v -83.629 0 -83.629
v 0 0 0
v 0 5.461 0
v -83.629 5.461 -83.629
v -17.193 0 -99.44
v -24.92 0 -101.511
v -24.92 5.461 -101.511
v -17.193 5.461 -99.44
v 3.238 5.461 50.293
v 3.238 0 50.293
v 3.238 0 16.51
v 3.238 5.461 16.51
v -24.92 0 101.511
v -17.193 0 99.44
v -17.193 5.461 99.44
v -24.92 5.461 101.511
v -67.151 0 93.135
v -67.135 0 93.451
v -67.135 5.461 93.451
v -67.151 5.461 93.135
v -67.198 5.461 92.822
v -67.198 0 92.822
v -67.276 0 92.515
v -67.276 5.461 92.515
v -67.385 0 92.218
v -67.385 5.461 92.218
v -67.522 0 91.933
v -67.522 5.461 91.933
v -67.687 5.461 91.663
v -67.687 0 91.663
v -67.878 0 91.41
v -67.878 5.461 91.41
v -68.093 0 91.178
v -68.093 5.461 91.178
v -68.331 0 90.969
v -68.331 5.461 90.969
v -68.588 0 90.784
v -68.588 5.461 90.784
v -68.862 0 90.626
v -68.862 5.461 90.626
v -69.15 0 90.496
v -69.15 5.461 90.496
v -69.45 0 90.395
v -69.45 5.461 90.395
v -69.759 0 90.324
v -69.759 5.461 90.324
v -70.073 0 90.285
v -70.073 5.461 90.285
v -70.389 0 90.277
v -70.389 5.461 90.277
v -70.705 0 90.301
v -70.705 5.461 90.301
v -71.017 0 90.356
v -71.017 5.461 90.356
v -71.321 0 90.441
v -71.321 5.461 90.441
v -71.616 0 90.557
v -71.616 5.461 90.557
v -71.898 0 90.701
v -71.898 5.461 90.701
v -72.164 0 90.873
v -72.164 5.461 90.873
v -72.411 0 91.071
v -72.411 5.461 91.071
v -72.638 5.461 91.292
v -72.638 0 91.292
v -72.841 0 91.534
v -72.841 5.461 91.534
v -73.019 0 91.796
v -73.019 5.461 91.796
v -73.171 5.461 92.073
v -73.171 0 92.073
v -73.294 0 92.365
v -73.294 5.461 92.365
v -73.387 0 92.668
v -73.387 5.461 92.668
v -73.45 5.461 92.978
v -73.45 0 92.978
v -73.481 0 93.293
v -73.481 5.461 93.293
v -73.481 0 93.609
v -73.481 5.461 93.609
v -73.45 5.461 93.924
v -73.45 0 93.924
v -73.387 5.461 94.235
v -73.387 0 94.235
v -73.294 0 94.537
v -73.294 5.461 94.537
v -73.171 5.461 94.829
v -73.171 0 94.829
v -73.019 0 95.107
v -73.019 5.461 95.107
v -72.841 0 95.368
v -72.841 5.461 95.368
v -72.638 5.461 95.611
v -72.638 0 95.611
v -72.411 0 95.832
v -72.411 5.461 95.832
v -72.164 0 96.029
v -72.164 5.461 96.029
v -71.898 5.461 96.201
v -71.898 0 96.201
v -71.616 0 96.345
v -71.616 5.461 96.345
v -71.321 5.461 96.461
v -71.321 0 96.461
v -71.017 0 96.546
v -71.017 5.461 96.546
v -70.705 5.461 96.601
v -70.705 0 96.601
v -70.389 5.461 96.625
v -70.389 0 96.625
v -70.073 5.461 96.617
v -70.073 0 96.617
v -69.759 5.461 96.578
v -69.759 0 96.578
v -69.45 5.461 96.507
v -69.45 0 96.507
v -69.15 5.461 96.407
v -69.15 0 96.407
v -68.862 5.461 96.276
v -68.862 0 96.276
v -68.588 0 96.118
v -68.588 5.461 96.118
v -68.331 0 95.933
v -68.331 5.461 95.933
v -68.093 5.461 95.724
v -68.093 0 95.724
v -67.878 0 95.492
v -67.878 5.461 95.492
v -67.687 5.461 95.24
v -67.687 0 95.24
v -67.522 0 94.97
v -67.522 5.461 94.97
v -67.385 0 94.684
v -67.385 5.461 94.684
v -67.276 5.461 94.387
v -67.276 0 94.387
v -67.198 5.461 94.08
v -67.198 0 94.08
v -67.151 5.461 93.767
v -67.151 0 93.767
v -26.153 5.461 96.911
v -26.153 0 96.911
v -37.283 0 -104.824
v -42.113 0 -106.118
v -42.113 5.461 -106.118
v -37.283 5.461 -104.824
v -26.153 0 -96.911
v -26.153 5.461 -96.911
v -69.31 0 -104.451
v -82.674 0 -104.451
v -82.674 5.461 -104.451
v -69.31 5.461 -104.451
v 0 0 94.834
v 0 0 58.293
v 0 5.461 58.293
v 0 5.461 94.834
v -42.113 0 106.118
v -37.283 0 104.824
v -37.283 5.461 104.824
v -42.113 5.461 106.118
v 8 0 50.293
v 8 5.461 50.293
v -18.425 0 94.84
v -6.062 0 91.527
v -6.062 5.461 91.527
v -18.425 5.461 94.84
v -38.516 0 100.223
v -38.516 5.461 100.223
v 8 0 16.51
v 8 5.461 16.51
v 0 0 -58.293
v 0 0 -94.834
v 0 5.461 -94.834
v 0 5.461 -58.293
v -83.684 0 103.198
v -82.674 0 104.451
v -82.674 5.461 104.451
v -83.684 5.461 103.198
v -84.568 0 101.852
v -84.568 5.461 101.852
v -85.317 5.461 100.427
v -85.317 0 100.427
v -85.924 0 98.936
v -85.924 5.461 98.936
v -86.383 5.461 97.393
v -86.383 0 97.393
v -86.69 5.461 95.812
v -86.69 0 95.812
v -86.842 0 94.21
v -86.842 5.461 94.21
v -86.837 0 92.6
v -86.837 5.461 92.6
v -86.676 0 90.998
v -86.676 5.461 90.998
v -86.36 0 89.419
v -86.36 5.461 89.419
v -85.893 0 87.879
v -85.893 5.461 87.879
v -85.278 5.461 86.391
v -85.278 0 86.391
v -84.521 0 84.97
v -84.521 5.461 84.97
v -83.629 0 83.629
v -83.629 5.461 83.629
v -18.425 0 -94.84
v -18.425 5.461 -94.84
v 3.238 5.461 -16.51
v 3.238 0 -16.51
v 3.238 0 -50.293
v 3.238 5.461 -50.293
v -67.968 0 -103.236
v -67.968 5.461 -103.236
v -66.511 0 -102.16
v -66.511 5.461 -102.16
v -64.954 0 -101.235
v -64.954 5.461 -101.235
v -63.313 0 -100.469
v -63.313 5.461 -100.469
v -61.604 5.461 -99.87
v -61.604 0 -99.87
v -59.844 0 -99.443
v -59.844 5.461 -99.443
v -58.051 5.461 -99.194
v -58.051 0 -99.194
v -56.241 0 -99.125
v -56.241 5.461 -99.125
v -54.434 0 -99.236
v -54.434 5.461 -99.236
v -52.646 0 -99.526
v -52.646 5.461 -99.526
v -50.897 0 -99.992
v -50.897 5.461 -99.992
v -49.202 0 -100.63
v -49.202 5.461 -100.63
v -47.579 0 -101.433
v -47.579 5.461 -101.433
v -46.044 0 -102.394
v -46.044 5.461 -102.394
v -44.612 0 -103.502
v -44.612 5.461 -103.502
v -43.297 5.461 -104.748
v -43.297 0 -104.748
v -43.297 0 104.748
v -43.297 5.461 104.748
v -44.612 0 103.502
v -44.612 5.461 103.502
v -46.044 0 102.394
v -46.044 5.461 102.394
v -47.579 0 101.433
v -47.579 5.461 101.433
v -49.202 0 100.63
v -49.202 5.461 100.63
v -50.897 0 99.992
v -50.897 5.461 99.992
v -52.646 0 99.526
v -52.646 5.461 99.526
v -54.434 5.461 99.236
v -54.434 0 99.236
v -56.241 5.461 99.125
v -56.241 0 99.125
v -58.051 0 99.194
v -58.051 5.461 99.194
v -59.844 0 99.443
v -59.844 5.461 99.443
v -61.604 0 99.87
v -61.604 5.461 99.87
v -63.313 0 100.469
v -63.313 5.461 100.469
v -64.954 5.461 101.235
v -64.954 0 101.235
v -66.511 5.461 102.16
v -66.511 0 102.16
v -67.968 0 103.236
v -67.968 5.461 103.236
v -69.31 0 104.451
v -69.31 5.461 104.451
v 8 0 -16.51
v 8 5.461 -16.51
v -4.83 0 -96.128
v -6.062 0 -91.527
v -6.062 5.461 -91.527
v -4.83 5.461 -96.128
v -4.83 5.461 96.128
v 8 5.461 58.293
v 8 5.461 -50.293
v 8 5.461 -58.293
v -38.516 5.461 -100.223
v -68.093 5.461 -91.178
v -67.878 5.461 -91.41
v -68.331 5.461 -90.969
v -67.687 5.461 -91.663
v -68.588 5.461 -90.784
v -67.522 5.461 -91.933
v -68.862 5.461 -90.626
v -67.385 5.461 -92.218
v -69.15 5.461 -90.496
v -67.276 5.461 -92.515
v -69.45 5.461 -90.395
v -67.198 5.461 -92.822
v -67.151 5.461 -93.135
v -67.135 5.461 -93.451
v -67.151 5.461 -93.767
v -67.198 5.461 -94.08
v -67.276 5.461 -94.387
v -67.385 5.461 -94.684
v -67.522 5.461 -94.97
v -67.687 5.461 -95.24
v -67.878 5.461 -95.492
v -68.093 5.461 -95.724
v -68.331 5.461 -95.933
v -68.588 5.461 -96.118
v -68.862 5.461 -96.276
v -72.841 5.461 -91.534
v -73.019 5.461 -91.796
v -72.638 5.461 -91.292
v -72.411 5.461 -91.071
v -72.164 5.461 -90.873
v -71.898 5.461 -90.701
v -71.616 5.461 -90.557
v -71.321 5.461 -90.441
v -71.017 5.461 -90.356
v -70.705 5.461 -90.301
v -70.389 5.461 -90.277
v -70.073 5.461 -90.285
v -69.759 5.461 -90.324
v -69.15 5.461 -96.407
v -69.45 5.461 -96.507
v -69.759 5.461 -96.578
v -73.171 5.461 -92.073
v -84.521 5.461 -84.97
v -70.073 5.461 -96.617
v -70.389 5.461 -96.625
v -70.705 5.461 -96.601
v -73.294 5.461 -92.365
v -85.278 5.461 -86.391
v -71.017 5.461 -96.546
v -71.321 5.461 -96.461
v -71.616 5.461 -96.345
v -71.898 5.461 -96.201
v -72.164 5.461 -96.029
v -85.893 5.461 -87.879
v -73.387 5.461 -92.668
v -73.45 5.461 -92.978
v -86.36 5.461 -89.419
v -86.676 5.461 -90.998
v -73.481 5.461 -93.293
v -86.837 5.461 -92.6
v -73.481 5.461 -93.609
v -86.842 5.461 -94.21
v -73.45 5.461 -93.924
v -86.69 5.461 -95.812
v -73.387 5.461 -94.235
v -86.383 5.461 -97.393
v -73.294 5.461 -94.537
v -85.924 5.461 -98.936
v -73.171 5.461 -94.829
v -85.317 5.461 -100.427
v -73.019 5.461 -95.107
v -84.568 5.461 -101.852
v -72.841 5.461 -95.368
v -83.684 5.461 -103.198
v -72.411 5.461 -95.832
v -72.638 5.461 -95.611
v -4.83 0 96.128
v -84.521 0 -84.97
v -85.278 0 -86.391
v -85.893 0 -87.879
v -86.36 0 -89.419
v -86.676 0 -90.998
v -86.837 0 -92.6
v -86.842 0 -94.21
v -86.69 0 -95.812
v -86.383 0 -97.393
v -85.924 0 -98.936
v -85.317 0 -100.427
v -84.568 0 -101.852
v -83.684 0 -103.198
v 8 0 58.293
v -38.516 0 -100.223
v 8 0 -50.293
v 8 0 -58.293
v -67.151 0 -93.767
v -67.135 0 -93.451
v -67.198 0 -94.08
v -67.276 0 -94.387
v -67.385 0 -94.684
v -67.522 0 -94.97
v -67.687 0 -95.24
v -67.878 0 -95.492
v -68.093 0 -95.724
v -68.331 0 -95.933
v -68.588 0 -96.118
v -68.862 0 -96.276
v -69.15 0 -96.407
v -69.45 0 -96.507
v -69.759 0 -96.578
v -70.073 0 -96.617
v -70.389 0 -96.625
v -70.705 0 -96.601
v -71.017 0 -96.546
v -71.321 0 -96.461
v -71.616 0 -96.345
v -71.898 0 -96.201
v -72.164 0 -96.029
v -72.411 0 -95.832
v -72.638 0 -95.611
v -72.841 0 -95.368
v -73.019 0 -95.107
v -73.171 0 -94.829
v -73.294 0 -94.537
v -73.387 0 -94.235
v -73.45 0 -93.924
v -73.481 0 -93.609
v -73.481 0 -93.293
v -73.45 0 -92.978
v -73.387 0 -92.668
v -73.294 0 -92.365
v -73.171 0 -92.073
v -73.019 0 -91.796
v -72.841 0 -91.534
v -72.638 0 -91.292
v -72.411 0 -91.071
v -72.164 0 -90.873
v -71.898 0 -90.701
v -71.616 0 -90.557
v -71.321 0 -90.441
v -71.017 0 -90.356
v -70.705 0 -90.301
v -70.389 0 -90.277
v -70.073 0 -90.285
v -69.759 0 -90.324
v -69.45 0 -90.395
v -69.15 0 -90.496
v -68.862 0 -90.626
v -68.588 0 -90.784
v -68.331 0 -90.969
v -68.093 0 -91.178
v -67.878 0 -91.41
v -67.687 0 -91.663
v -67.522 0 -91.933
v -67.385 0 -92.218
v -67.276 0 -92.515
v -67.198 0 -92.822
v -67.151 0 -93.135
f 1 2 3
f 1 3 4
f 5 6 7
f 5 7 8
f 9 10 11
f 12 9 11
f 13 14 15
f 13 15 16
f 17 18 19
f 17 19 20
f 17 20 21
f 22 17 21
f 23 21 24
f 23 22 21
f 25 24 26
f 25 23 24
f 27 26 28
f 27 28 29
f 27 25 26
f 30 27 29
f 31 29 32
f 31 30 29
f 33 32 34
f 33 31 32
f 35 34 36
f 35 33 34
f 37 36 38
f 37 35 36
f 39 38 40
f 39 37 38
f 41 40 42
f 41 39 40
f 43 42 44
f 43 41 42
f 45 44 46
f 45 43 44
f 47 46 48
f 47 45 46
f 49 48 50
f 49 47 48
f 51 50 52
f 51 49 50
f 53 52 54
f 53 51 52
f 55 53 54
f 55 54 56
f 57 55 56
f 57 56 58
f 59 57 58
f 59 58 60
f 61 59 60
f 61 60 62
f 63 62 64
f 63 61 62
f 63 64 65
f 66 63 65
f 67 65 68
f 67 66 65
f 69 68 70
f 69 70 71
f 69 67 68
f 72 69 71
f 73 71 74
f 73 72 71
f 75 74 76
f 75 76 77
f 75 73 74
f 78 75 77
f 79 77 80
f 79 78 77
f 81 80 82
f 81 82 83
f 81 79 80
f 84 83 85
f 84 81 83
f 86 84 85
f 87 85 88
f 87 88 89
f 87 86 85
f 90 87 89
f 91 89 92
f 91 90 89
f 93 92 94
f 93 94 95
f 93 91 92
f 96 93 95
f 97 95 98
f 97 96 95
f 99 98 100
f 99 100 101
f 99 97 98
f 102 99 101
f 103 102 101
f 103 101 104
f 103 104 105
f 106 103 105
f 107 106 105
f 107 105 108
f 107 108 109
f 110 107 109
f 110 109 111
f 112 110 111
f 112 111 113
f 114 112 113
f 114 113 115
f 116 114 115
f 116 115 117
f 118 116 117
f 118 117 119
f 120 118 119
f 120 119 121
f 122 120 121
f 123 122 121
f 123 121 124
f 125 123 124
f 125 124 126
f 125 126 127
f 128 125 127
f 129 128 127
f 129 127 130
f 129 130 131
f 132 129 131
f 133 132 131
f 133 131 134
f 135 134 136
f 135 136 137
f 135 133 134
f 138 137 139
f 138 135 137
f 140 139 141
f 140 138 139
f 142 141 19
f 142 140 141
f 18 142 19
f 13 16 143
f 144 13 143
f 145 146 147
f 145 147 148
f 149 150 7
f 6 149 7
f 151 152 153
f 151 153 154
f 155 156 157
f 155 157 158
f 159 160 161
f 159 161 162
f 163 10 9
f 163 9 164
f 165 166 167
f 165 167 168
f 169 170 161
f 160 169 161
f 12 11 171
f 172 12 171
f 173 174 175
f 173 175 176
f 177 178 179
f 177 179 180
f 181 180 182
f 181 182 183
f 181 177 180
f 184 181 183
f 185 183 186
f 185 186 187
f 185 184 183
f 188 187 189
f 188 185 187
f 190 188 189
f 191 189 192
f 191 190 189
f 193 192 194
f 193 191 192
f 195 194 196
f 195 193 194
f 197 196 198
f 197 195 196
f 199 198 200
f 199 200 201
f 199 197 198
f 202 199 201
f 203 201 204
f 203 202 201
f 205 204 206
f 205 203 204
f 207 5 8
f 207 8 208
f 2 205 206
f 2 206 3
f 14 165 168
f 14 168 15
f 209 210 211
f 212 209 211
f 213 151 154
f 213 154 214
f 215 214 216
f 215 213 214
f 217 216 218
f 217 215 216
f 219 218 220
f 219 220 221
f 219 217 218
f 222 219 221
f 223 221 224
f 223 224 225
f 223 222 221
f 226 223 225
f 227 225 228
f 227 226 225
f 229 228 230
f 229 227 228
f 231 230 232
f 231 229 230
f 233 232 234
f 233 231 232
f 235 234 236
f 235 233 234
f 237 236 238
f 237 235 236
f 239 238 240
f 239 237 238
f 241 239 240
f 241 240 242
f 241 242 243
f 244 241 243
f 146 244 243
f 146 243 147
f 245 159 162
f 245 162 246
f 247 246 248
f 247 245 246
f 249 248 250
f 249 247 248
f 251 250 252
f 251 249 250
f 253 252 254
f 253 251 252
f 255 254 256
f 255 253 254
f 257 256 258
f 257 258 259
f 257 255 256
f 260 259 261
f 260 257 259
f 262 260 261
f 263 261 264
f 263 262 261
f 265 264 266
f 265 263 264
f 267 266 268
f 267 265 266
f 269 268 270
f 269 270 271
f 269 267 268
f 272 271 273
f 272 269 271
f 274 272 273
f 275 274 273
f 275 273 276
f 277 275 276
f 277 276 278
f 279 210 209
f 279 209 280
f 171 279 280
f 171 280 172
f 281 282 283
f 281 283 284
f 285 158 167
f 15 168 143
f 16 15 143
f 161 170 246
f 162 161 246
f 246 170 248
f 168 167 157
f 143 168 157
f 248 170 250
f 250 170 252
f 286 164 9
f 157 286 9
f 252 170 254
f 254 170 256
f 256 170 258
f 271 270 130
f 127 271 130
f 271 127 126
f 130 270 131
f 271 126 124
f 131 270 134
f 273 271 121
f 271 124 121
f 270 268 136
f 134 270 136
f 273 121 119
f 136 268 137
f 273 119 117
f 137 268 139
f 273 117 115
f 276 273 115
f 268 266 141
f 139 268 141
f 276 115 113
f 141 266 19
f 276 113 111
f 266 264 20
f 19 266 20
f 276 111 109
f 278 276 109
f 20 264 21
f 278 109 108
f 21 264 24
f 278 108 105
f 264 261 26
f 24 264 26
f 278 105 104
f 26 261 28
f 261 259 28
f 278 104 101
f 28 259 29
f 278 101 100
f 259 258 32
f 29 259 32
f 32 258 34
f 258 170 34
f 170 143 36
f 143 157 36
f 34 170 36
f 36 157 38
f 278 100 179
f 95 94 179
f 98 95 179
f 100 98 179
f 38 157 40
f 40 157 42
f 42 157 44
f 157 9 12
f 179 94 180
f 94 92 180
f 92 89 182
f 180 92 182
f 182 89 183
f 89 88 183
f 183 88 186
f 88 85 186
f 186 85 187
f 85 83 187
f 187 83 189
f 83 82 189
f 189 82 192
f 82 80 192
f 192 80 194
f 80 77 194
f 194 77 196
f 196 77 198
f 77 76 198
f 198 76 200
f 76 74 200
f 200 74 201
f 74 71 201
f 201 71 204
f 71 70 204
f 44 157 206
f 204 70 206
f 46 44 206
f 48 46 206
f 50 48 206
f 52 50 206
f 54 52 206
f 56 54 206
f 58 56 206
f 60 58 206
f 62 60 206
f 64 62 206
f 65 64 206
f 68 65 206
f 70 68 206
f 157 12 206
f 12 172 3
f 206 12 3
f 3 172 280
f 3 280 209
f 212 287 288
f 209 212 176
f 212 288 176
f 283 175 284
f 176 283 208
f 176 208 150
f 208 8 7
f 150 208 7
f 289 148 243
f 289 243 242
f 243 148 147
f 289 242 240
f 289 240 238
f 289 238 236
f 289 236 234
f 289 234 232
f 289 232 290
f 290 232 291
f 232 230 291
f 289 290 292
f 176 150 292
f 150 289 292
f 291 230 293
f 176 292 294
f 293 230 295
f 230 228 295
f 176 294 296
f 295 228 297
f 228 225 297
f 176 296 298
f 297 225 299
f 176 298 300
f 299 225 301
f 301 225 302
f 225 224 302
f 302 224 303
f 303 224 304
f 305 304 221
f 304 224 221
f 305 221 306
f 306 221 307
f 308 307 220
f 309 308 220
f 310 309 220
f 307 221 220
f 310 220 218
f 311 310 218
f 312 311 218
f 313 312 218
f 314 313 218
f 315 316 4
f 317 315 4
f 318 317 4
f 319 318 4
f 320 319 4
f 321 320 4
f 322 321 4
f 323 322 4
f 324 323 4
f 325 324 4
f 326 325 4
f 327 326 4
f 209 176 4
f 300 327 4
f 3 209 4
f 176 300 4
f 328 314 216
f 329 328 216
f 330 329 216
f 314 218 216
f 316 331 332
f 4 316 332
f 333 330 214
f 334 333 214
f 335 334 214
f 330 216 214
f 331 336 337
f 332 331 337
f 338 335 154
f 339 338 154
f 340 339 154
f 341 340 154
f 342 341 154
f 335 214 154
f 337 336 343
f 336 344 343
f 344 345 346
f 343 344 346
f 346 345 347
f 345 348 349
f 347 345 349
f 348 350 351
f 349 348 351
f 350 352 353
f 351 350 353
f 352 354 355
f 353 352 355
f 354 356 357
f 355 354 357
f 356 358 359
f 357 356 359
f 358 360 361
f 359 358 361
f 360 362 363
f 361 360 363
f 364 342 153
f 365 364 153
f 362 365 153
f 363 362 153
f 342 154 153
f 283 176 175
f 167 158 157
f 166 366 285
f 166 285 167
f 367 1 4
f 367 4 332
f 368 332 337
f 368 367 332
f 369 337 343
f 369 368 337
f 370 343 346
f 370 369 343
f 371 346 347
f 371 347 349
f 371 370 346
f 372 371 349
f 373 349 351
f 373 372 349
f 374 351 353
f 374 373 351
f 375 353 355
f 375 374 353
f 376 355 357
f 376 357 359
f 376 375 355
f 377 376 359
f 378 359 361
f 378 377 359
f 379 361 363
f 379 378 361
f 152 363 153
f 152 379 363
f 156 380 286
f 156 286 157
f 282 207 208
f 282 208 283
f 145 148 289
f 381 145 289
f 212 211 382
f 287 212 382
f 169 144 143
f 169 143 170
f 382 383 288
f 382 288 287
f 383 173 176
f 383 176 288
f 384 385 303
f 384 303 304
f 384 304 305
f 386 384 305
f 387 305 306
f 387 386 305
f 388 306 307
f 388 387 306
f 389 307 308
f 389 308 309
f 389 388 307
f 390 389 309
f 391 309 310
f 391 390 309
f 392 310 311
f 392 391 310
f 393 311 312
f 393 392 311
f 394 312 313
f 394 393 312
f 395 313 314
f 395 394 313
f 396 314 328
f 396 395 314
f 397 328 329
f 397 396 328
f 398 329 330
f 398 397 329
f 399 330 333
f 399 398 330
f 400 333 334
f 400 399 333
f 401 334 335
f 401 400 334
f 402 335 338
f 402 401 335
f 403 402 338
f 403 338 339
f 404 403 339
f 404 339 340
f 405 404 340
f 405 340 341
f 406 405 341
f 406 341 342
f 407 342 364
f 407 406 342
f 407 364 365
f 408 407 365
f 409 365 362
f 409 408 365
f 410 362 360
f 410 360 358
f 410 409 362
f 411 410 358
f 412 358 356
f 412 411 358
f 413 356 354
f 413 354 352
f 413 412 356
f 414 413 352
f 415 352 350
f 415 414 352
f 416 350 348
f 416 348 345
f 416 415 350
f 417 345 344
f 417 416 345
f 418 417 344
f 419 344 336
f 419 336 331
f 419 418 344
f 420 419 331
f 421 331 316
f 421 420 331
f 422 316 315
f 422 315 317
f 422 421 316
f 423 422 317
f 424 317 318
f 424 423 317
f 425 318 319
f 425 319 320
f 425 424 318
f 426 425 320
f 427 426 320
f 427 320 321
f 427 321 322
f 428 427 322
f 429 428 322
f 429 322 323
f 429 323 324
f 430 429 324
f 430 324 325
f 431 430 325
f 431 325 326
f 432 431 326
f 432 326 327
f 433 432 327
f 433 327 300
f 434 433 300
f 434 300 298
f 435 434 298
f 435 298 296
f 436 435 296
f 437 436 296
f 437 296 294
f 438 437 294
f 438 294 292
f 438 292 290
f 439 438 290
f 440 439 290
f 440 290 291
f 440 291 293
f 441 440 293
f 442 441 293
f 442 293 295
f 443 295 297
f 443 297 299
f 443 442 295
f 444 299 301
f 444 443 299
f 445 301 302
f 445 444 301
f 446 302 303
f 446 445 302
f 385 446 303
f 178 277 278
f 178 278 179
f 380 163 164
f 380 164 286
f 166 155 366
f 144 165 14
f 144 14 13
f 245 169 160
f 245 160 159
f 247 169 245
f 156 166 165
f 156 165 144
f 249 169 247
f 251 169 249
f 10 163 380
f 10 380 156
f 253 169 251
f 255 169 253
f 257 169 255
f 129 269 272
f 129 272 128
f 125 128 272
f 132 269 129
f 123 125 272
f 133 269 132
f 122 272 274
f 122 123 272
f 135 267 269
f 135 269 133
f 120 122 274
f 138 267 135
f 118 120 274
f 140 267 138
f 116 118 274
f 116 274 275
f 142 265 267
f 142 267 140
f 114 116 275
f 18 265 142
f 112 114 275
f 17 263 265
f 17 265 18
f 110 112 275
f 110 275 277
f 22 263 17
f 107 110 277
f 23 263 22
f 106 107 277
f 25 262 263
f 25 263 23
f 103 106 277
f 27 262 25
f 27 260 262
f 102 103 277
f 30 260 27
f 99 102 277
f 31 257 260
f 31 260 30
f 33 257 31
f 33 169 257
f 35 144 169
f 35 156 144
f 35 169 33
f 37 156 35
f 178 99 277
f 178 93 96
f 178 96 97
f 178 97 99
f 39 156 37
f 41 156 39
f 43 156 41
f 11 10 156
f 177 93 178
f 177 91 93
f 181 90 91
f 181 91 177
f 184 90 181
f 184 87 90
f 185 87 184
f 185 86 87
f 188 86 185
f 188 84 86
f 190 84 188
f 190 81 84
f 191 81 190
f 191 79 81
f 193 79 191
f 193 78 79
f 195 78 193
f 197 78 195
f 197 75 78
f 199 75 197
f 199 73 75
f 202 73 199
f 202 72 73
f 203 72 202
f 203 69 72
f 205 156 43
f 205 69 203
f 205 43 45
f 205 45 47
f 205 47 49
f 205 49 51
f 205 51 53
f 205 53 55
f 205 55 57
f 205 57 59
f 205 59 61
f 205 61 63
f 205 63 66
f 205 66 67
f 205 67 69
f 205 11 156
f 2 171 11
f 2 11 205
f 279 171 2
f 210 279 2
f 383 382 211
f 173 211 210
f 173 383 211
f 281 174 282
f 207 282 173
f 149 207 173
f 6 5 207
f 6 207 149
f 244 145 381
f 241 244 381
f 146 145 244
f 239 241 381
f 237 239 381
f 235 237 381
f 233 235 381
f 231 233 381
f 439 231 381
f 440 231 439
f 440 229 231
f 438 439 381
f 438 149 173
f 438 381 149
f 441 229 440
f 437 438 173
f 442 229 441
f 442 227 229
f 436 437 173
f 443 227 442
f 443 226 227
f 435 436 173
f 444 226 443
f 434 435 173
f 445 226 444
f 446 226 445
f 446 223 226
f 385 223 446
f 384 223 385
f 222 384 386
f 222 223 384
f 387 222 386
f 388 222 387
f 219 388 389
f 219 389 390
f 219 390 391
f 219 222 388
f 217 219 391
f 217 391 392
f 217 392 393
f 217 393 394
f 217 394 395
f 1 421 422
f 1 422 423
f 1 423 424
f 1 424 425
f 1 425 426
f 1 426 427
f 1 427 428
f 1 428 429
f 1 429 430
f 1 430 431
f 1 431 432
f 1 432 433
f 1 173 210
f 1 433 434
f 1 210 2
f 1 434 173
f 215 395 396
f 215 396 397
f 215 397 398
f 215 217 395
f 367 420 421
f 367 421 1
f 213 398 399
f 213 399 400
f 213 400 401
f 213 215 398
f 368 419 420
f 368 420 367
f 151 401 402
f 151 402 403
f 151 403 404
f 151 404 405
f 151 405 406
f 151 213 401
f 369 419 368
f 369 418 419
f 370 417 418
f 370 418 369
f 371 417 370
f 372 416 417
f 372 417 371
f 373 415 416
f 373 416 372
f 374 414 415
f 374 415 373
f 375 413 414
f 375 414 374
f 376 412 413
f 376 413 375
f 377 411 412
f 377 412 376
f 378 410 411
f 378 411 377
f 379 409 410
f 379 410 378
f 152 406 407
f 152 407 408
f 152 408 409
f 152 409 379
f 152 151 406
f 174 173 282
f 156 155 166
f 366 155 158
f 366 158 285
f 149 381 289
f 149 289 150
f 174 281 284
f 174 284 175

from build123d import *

# Parameters (mm, degrees)
SKETCH1_R           = 3.175
BOSS_EXTRUDE1_DEPTH = 5.461
SKETCH2_W           = 4.7625
SKETCH2_H           = 33.783
CUT_EXTRUDE1_DEPTH  = 6.461


with BuildPart() as part:
    # Sketch1 → Boss-Extrude1 (new body)
    with BuildSketch(Plane(origin=(0, 0, 0), x_dir=(1, 0, 0), z_dir=(0, 1, 0))):
        with BuildLine():
            Line((-82.674132744, 104.451069294), (-69.310188895, 104.451069294))
            ThreePointArc((-69.310188895, 104.451069294), (-55.336180049, 99.157726681), (-42.113057451, 106.117714323))
            Line((-42.113057451, 106.117714323), (0, 94.833554589))
            Line((0, 94.833554589), (0, 58.293))
            Line((0, 58.293), (8, 58.293))
            Line((8, 58.293), (8, -58.293))
            Line((8, -58.293), (0, -58.293))
            Line((0, -58.293), (0, -94.833554589))
            Line((0, -94.833554589), (-42.113057451, -106.117714323))
            ThreePointArc((-42.113057451, -106.117714323), (-55.336180049, -99.157726681), (-69.310188895, -104.451069294))
            Line((-69.310188895, -104.451069294), (-82.674132744, -104.451069294))
            ThreePointArc((-82.674132744, -104.451069294), (-86.841727728, -94.209575285), (-83.629476528, -83.629476528))
            Line((-83.629476528, -83.629476528), (0, 0))
            Line((0, 0), (-83.629476528, 83.629476528))
            ThreePointArc((-83.629476528, 83.629476528), (-86.841727728, 94.209575285), (-82.674132744, 104.451069294))
        make_face()
        with Locations((-70.310188895, 93.451069294)):
            Circle(SKETCH1_R, mode=Mode.SUBTRACT)
        with Locations((-70.310188895, -93.451069294)):
            Circle(SKETCH1_R, mode=Mode.SUBTRACT)
    extrude(amount=BOSS_EXTRUDE1_DEPTH)

    # Sketch2 → Cut-Extrude1 (cut, through all)
    with BuildSketch(Plane(origin=(0, 0, 0), x_dir=(1, 0, 0), z_dir=(0, 1, 0))):
        Polygon((-17.19282542, -99.440358276), (-4.829629131, -96.127649814), (-6.062254834, -91.527428067), (-18.425451123, -94.840136528), align=None)
        Polygon((-37.283428319, -104.823619098), (-24.920232031, -101.510910637), (-26.152857733, -96.910688889), (-38.516054022, -100.22339735), align=None)
        with Locations((5.61875, -33.4015)):
            Rectangle(SKETCH2_W, SKETCH2_H)
        Polygon((-38.516054022, 100.22339735), (-26.152857733, 96.910688889), (-24.920232031, 101.510910637), (-37.283428319, 104.823619098), align=None)
        Polygon((-18.425451123, 94.840136528), (-6.062254834, 91.527428067), (-4.829629131, 96.127649814), (-17.19282542, 99.440358276), align=None)
        with Locations((5.61875, 33.4015)):
            Rectangle(SKETCH2_W, SKETCH2_H)
    extrude(amount=CUT_EXTRUDE1_DEPTH, mode=Mode.SUBTRACT)


solid = part.part
